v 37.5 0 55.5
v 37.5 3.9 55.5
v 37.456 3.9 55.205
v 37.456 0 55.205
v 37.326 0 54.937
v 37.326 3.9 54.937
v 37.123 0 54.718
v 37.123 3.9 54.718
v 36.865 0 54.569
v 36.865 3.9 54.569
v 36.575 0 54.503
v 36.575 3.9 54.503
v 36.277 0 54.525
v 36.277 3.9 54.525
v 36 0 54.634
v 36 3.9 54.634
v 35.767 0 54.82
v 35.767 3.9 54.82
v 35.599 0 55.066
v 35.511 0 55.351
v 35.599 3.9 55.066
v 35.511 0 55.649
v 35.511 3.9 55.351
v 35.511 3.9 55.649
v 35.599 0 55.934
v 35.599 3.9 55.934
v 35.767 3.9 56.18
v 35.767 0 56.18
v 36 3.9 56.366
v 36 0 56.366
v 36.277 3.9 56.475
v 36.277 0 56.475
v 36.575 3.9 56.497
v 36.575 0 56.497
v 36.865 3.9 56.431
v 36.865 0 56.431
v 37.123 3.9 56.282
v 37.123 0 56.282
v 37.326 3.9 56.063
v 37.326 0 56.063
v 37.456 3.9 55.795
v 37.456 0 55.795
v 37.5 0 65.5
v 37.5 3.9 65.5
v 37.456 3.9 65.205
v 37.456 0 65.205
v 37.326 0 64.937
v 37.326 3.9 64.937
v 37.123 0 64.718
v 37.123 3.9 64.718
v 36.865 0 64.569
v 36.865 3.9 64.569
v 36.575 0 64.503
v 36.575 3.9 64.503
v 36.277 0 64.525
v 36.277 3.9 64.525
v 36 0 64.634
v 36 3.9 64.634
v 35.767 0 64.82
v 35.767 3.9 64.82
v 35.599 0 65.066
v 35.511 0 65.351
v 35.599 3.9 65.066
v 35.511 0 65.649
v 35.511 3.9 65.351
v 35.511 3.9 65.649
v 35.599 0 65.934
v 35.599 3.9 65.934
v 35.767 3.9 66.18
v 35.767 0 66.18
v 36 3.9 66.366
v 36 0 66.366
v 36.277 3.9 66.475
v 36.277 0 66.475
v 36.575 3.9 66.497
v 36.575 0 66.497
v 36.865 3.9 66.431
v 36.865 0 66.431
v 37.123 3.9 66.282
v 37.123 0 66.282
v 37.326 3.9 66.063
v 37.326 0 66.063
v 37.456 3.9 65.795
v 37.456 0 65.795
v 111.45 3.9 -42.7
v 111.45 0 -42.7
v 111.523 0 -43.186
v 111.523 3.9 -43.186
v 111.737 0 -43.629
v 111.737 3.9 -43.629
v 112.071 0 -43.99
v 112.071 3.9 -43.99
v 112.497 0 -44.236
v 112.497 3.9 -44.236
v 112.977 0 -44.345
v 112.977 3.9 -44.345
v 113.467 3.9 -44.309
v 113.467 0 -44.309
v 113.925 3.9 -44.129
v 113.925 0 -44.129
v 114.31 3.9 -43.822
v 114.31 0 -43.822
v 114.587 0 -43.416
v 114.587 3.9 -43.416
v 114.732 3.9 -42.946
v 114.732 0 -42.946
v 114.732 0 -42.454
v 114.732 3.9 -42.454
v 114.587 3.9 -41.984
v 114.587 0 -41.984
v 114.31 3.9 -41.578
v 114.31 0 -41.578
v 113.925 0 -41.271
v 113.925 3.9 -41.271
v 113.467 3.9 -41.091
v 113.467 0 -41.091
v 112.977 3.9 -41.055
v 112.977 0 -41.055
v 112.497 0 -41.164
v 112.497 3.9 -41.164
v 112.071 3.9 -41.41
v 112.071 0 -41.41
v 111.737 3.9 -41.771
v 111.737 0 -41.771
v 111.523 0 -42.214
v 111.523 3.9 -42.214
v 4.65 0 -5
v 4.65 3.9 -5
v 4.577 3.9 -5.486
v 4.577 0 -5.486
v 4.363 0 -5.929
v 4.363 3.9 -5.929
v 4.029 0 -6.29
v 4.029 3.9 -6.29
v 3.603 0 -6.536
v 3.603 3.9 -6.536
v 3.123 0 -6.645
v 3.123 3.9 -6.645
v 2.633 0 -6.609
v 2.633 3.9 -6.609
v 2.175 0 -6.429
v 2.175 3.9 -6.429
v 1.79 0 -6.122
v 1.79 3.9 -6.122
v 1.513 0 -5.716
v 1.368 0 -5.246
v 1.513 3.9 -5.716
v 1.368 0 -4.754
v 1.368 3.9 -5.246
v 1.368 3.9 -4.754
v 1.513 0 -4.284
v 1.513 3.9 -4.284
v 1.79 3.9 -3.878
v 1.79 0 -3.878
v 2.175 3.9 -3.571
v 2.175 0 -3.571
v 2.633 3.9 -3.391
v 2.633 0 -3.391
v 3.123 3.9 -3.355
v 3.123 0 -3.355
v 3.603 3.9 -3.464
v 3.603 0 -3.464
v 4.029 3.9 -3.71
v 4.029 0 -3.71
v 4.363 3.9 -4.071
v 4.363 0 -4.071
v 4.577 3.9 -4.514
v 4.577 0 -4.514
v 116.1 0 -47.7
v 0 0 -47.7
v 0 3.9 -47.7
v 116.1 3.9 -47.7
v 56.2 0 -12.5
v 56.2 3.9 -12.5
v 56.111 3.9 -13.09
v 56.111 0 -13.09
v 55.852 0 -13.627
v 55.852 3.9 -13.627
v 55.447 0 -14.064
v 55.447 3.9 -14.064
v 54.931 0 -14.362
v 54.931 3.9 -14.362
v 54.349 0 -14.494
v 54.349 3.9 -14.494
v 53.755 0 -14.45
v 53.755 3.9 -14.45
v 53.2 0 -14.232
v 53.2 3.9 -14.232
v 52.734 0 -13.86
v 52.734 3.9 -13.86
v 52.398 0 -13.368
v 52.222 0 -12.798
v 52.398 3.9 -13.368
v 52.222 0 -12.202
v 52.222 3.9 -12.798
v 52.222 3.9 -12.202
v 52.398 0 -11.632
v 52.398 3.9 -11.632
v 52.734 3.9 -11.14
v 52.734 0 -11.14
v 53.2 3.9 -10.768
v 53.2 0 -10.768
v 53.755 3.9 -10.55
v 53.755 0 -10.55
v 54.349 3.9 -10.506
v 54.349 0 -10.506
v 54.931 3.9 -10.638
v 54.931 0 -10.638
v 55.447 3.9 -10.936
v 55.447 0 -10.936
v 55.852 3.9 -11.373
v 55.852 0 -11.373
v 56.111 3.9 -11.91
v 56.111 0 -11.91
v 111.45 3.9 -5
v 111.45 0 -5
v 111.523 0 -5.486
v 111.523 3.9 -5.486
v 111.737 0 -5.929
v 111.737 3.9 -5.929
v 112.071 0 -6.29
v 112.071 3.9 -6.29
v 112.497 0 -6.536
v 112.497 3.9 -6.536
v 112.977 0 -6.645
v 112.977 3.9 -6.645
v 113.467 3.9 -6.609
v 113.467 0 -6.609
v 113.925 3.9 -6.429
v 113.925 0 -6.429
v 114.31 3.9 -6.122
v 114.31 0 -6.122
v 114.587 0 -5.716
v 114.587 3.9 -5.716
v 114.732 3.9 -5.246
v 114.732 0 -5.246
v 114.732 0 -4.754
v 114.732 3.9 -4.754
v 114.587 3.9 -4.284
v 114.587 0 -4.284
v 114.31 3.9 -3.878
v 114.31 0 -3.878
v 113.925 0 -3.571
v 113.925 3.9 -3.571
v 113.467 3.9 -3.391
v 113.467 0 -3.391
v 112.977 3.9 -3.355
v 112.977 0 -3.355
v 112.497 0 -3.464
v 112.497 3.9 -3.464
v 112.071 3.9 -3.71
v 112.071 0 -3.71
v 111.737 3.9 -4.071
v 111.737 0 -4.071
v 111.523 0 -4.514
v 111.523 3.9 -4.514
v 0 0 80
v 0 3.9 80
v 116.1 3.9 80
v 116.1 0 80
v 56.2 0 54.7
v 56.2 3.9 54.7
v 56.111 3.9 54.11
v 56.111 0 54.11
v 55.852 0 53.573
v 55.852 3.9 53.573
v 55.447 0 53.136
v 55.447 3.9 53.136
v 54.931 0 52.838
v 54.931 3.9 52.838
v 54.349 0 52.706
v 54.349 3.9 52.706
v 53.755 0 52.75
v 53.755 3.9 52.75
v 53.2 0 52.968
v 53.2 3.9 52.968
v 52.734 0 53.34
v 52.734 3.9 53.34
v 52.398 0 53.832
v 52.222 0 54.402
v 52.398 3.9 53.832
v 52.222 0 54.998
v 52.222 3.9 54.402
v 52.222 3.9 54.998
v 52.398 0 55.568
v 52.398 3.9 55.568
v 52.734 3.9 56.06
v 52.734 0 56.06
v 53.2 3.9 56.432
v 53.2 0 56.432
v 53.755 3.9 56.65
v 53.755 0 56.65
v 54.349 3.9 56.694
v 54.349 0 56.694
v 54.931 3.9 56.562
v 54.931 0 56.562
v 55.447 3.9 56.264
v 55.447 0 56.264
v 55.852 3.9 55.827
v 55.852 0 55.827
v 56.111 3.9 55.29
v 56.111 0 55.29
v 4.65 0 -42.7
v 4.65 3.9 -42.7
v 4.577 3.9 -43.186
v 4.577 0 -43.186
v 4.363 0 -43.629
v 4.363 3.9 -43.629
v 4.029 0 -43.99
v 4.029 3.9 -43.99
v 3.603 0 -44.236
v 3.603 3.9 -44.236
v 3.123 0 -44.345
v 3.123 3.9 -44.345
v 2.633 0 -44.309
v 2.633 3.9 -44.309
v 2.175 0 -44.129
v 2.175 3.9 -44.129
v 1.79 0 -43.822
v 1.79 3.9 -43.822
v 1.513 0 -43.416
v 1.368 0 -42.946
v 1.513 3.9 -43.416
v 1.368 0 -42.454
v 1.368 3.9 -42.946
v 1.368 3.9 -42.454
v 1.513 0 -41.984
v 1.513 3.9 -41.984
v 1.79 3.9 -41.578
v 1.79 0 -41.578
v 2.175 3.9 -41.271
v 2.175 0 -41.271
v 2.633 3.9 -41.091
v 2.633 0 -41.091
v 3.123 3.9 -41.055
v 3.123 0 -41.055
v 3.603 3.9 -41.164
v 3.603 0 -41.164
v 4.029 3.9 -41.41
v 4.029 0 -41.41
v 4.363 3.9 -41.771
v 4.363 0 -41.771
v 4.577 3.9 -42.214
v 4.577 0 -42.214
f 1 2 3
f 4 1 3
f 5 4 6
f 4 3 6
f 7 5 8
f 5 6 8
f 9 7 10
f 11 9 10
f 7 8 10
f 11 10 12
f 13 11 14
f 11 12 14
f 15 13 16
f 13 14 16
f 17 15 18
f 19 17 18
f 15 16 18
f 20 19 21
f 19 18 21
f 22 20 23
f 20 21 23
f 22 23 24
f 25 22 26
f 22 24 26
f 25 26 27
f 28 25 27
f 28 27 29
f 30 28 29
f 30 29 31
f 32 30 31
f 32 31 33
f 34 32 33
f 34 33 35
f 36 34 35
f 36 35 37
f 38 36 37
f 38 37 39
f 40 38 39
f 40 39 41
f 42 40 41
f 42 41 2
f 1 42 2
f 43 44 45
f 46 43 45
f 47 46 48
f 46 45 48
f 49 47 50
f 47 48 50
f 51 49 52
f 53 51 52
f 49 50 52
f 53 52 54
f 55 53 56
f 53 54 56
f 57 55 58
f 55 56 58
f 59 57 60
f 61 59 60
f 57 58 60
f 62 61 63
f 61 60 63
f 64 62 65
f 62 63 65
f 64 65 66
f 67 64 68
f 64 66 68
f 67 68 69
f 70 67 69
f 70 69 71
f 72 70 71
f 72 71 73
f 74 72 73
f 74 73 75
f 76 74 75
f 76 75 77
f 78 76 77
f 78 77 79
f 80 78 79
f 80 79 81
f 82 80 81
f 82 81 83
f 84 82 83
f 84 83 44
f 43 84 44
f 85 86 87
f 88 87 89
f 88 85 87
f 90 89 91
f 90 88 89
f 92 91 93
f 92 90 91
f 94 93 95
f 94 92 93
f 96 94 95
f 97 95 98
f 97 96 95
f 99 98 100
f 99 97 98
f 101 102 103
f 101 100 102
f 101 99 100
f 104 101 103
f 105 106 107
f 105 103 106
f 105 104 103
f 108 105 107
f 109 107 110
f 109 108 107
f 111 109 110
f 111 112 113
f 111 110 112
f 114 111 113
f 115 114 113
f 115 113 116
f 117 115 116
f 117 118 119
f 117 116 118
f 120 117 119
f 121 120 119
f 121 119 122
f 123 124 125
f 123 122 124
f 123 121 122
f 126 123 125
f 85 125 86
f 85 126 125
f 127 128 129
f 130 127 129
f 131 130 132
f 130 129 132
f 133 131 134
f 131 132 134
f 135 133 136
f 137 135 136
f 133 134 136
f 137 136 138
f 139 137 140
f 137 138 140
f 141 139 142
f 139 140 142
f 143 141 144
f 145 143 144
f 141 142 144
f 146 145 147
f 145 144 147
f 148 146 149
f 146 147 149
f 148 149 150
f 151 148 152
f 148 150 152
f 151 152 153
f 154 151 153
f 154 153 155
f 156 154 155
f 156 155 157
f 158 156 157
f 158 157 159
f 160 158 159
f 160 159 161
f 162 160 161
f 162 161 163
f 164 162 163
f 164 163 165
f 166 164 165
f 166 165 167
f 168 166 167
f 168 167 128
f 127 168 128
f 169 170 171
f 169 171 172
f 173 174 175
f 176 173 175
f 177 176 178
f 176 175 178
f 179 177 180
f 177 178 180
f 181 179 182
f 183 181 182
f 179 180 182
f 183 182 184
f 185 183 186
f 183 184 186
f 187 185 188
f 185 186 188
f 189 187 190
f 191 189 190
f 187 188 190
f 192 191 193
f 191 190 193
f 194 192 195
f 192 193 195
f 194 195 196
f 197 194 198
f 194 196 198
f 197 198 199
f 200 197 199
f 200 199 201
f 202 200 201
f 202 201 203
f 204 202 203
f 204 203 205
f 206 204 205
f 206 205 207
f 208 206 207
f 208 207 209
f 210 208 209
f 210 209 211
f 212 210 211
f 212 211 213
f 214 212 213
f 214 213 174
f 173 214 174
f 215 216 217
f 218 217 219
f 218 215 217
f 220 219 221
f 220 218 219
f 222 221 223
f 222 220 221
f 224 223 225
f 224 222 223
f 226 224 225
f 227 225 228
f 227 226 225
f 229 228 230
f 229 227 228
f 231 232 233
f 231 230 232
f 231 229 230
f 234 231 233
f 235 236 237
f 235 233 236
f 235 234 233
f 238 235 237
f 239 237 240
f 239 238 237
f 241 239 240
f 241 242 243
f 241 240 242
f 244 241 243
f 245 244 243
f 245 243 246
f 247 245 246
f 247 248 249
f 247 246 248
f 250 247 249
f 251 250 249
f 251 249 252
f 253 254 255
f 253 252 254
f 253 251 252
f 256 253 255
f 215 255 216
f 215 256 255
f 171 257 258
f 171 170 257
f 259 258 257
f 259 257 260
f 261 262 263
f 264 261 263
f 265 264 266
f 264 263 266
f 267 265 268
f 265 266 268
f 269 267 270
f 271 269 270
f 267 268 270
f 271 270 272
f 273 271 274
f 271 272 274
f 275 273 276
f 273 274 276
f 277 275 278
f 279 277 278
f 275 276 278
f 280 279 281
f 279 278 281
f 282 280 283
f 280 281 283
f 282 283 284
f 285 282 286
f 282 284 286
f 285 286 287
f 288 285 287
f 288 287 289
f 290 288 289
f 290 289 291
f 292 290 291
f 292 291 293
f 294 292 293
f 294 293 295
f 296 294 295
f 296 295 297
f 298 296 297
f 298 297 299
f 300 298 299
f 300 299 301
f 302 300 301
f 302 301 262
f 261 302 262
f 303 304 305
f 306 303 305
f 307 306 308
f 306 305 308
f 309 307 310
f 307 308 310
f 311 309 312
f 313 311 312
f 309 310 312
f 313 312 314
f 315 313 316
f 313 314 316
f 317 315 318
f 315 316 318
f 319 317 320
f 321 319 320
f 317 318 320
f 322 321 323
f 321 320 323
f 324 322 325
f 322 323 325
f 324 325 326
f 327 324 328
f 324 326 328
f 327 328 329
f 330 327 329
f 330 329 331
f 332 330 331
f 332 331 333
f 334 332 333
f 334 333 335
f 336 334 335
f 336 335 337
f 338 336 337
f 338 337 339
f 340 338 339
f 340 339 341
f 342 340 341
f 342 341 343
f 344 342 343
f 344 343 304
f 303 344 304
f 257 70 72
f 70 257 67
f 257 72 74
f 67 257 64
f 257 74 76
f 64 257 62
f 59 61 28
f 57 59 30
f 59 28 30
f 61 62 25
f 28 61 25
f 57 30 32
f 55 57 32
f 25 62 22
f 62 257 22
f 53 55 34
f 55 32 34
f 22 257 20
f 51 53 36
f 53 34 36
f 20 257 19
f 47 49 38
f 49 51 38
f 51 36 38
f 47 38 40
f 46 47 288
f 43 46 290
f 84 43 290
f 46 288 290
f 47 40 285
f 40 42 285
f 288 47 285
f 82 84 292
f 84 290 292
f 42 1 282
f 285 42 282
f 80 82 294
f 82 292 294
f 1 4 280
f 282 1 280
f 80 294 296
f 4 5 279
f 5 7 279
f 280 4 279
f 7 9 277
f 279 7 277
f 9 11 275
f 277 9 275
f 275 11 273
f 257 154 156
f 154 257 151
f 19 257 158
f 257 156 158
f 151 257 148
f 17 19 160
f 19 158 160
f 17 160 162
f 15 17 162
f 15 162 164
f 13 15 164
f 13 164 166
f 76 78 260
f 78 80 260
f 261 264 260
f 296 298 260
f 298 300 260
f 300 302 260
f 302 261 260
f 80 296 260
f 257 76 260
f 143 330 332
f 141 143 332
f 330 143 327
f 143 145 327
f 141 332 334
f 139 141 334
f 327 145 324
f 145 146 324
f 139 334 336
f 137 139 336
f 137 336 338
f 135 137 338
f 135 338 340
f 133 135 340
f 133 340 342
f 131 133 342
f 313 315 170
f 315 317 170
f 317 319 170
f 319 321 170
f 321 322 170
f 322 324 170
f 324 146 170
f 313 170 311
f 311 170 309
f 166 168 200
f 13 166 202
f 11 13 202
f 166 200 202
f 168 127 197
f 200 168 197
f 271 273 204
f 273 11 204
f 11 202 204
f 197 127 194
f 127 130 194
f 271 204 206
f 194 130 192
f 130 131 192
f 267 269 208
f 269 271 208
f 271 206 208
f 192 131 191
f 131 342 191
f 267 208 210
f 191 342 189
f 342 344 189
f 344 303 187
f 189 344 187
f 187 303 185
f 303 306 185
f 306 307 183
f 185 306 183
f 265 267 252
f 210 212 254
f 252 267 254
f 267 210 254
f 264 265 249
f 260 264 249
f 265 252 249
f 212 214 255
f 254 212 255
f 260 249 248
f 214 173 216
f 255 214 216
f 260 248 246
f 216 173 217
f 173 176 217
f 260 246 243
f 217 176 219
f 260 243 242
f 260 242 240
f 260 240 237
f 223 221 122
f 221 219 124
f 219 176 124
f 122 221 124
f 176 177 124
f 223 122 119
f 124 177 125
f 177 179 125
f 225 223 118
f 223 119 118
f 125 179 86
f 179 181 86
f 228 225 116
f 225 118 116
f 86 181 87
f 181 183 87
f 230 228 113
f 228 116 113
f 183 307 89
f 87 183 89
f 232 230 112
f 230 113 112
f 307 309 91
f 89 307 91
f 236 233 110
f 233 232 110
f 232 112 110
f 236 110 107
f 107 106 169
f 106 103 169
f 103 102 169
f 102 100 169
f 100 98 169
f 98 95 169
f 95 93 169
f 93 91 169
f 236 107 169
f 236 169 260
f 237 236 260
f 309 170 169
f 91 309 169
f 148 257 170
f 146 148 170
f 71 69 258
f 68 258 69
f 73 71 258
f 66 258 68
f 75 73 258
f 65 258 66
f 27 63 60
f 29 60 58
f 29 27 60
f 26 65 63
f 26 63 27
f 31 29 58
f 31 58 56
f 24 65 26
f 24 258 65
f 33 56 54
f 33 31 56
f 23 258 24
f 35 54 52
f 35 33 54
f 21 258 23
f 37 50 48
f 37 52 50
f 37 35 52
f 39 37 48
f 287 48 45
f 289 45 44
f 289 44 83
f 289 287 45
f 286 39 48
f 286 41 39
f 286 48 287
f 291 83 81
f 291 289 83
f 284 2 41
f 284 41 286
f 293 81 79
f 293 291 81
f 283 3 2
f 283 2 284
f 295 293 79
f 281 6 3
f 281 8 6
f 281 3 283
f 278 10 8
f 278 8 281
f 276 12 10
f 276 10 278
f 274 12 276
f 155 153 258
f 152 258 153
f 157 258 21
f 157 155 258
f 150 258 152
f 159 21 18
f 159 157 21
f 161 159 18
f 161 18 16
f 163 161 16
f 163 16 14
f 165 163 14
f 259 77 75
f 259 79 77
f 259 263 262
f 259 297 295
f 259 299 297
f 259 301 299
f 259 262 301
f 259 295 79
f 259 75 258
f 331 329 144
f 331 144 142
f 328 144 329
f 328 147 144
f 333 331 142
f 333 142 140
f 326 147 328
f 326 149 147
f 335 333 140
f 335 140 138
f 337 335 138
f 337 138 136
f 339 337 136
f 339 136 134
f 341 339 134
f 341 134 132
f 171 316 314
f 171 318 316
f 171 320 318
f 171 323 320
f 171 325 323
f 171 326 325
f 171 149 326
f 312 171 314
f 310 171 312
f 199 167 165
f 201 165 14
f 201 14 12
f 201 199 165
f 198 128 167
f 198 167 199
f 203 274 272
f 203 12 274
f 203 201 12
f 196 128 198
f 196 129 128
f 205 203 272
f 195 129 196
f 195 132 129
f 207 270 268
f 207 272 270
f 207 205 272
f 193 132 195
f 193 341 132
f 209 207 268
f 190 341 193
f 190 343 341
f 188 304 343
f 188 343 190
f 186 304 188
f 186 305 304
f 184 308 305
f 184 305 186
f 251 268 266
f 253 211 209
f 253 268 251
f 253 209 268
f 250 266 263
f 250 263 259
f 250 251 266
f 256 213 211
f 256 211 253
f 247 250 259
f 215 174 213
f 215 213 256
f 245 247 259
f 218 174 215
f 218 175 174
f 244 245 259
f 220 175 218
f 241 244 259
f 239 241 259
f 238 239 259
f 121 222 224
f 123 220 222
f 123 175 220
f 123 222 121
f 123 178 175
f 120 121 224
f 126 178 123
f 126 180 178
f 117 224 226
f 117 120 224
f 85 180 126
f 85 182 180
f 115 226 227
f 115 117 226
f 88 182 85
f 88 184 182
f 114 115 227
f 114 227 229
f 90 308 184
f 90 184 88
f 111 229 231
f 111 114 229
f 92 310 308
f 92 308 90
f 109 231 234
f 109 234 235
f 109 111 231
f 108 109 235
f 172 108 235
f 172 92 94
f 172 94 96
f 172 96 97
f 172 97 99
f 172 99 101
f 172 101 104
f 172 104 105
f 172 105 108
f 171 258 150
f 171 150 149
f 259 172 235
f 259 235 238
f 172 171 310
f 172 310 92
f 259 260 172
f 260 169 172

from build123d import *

# Parameters (mm, degrees)
SKETCH1_W           = 116.1
SKETCH1_H           = 47.7
BOSS_EXTRUDE1_DEPTH = 3.9
SKETCH4_R           = 1.65
CUT_EXTRUDE3_DEPTH  = 4.9
SKETCH5_R           = 1.65
CUT_EXTRUDE4_DEPTH  = 4.9
SKETCH7_W           = 116.1
SKETCH7_H           = 3.9
BOSS_EXTRUDE2_DEPTH = 80
SKETCH8_R           = 2
CUT_EXTRUDE5_DEPTH  = 4.9
SKETCH9_R           = 1
CUT_EXTRUDE6_DEPTH  = 4.9


with BuildPart() as part:
    # Sketch1 → Boss-Extrude1 (new body)
    with BuildSketch(Plane(origin=(0, 0, 0), x_dir=(1, 0, 0), z_dir=(0, 1, 0))):
        with Locations((58.05, 23.85)):
            Rectangle(SKETCH1_W, SKETCH1_H)
    extrude(amount=BOSS_EXTRUDE1_DEPTH)

    # Sketch4 → Cut-Extrude3 (cut, through all)
    with BuildSketch(Plane(origin=(0, 3.9, 0), x_dir=(1, 0, 0), z_dir=(0, 1, 0))):
        with Locations((3, 42.7)):
            Circle(SKETCH4_R)
    cut_extrude3 = extrude(amount=-CUT_EXTRUDE3_DEPTH, mode=Mode.SUBTRACT)

    # Sketch5 → Cut-Extrude4 (cut, through all)
    with BuildSketch(Plane(origin=(0, 3.9, 0), x_dir=(1, 0, 0), z_dir=(0, 1, 0))):
        with Locations((3, 5)):
            Circle(SKETCH5_R)
    cut_extrude4 = extrude(amount=-CUT_EXTRUDE4_DEPTH, mode=Mode.SUBTRACT)

    # Mirror1: Cut-Extrude3, Cut-Extrude4 across plane
    add(cut_extrude3.mirror(Plane.ZY.offset(-58.05)), mode=Mode.SUBTRACT)
    add(cut_extrude4.mirror(Plane.ZY.offset(-58.05)), mode=Mode.SUBTRACT)

    # Sketch7 → Boss-Extrude2 (add)
    with BuildSketch(Plane.XY):
        with Locations((58.05, 1.95)):
            Rectangle(SKETCH7_W, SKETCH7_H)
    extrude(amount=BOSS_EXTRUDE2_DEPTH)

    # Sketch8 → Cut-Extrude5 (cut, through all)
    with BuildSketch(Plane(origin=(0, 3.9, 0), x_dir=(1, 0, 0), z_dir=(0, 1, 0))):
        with Locations((54.2, -54.7)):
            Circle(SKETCH8_R)
        with Locations((54.2, 12.5)):
            Circle(SKETCH8_R)
    extrude(amount=-CUT_EXTRUDE5_DEPTH, mode=Mode.SUBTRACT)

    # Sketch9 → Cut-Extrude6 (cut, through all)
    with BuildSketch(Plane(origin=(0, 3.9, 0), x_dir=(1, 0, 0), z_dir=(0, 1, 0))):
        with Locations((36.5, -65.5)):
            Circle(SKETCH9_R)
        with Locations((36.5, -55.5)):
            Circle(SKETCH9_R)
    extrude(amount=-CUT_EXTRUDE6_DEPTH, mode=Mode.SUBTRACT)


solid = part.part
